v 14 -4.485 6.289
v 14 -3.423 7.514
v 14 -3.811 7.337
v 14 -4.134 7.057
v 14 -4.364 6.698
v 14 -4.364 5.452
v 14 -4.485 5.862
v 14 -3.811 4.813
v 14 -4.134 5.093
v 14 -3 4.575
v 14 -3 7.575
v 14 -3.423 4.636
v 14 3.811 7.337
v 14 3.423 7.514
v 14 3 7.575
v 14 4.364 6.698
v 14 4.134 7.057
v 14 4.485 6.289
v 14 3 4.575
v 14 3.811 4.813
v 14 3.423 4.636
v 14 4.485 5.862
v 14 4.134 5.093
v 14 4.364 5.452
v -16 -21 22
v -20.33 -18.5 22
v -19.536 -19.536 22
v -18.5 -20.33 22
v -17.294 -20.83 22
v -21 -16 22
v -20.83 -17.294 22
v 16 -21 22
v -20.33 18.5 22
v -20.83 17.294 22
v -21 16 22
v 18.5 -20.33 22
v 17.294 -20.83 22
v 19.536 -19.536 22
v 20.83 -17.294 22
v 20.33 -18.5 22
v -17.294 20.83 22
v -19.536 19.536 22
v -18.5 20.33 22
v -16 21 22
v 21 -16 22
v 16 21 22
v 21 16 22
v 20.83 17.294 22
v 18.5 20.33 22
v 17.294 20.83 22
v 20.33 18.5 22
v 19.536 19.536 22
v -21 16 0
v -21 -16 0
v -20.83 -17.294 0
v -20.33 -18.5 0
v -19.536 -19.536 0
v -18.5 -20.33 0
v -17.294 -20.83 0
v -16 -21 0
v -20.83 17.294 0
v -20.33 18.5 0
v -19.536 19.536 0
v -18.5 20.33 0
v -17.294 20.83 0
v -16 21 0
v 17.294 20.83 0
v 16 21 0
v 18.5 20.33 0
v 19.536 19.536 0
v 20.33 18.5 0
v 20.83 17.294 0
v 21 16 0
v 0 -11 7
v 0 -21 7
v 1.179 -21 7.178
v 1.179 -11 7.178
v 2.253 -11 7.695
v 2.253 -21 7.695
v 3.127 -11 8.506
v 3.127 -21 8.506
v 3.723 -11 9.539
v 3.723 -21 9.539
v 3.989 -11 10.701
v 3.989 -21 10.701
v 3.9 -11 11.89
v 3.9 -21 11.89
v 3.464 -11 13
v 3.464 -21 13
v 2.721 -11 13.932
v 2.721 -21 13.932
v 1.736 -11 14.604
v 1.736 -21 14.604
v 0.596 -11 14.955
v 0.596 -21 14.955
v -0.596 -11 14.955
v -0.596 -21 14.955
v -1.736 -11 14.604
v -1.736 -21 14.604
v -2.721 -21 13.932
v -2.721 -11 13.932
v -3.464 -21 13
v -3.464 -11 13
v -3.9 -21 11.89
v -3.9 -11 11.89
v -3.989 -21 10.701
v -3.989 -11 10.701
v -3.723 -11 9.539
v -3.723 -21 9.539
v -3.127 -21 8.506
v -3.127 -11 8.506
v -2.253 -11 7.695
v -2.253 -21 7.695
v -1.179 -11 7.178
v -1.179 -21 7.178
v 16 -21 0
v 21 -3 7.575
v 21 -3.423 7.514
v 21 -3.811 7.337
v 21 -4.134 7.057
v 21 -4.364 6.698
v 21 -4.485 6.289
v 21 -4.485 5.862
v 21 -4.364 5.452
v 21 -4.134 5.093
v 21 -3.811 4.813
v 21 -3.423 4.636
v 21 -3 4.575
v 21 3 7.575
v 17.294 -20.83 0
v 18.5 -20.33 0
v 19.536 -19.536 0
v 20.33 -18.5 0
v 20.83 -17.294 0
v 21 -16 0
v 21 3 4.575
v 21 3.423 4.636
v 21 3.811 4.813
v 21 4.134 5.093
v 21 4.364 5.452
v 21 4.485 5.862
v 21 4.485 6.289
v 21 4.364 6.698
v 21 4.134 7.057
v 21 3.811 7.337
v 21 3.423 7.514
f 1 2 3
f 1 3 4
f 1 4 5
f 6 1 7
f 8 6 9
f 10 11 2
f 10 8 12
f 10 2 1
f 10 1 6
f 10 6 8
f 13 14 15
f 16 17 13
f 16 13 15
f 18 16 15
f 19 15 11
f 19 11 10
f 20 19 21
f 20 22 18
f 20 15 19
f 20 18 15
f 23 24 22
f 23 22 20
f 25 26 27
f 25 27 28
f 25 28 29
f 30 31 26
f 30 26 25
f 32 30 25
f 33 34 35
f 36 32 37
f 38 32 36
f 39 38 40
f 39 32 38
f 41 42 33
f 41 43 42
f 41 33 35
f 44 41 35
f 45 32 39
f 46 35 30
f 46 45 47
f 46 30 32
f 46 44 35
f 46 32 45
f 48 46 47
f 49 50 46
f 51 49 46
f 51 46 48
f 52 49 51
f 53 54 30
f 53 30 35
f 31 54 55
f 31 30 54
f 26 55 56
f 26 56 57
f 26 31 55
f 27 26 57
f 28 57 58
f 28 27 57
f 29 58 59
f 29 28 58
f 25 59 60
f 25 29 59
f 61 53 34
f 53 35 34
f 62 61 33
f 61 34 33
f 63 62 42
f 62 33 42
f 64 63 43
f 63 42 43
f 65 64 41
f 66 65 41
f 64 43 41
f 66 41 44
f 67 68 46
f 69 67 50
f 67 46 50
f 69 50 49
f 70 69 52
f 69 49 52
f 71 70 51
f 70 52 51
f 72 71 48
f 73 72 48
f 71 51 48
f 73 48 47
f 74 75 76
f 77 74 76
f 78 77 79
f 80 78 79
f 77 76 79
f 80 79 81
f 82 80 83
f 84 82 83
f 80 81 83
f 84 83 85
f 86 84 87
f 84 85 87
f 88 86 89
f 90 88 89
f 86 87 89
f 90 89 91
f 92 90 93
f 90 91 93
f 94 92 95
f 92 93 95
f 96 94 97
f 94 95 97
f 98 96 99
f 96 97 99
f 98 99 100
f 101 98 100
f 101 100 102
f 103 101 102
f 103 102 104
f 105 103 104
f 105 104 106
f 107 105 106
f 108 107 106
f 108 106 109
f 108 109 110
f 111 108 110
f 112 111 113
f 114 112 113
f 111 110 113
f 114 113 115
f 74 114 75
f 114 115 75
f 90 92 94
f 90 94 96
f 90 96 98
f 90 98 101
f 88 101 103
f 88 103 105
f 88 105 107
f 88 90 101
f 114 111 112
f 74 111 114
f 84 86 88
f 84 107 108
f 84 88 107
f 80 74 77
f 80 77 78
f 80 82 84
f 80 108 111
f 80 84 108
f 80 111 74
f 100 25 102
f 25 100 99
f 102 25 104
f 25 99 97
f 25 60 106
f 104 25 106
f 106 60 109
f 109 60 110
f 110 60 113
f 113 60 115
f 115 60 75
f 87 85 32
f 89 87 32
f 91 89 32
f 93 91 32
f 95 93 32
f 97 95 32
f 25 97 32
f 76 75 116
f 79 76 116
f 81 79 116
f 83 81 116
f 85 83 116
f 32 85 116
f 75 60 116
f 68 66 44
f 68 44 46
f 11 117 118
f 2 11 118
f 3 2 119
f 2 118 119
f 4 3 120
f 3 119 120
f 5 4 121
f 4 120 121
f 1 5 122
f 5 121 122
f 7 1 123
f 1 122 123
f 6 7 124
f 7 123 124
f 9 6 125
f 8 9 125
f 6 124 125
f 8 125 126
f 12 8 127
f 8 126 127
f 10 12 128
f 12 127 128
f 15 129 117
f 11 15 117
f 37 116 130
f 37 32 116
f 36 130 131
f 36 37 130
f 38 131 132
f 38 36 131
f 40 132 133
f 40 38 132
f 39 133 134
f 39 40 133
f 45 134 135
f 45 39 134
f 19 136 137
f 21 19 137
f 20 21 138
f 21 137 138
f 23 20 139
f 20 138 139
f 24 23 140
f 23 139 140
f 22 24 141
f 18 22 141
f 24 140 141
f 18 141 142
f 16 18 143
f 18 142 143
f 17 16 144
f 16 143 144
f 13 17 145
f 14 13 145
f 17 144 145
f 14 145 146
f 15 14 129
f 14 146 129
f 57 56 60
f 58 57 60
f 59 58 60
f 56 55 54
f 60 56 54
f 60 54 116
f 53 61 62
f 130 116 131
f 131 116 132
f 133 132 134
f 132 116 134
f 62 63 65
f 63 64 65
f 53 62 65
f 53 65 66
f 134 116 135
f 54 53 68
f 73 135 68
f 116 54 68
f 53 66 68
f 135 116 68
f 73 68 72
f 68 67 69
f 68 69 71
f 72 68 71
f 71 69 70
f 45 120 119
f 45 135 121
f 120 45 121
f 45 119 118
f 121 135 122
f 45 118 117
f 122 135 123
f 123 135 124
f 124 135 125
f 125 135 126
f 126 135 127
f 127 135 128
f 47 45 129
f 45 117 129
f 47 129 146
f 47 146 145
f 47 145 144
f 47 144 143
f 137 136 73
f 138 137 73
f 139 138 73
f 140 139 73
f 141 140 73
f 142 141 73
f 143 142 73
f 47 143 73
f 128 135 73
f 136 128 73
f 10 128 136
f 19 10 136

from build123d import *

# Parameters (mm, degrees)
SKETCH_1_W          = 42
SKETCH_1_H          = 42
EXTRUDE_1_DEPTH     = 22
SKETCH_2_R          = 1.5
CUT_EXTRUDE_1_DEPTH = 7
SKETCH_3_R          = 4
CUT_EXTRUDE_2_DEPTH = 10
FILLET_1_R          = 5


with BuildPart() as part:
    # 草图1 → 凸台-拉伸1 (new body)
    with BuildSketch(Plane.XY):
        Rectangle(SKETCH_1_W, SKETCH_1_H)
    extrude(amount=EXTRUDE_1_DEPTH)

    # 草图2 → 切除-拉伸1 (cut)
    with BuildSketch(Plane(origin=(21, 0, 0), x_dir=(0, 0, -1), z_dir=(1, 0, 0))):
        with Locations((-6.07507845, 3)):
            Circle(SKETCH_2_R)
        with BuildLine():
            ThreePointArc((-4.57507845, 3), (-6.07507845, 1.5), (-7.57507845, 3))
            Line((-7.57507845, 3), (-7.57507845, -3))
            ThreePointArc((-7.57507845, -3), (-6.07507845, -1.5), (-4.57507845, -3))
            Line((-4.57507845, -3), (-4.57507845, 3))
        make_face()
        with Locations((-6.07507845, -3)):
            Circle(SKETCH_2_R)
    extrude(amount=-CUT_EXTRUDE_1_DEPTH, mode=Mode.SUBTRACT)

    # 草图3 → 切除-拉伸2 (cut)
    with BuildSketch(Plane.XZ.offset(21)):
        with Locations(Location((0, 11, 0), (0, 0, 270))):
            Circle(SKETCH_3_R)
    extrude(amount=-CUT_EXTRUDE_2_DEPTH, mode=Mode.SUBTRACT)

    # 圆角1
    fillet_1_edges = [part.edges().sort_by_distance(p)[0] for p in [
        (-21, 21, 11),
        (21, 21, 11),
        (21, -21, 11),
        (-21, -21, 11),
    ]]
    fillet(fillet_1_edges, radius=FILLET_1_R)


solid = part.part
